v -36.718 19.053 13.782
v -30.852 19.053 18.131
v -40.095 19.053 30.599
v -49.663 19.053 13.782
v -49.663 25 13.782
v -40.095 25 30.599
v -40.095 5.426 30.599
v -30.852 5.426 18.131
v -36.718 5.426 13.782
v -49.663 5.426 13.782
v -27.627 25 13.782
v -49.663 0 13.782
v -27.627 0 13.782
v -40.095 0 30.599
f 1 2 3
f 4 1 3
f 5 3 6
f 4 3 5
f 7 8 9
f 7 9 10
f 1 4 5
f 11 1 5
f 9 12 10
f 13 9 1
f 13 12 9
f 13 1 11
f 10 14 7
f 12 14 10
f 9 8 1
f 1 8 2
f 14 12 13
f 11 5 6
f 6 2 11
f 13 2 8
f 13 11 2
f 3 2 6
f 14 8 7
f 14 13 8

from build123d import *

# Parameters (mm, degrees)
F1_DEPTH = 25
F2_W     = 13.627150096
F2_H     = 15.5199997797
F3_DEPTH = 25
F4_R     = 3.852849114
F5_DEPTH = 25


with BuildPart() as f1:
    # F0 (on Front) → F1 (new body)
    with BuildSketch(Plane.XZ):
        Polygon((-27.6273339987, 13.7823959813), (-40.0947295129, 30.5988863111), (-49.6627315879, 13.7823959813), align=None)
    extrude(amount=-F1_DEPTH)

    # F2 (on face) → F3 (cut)
    with BuildSketch(Plane(origin=(-11.2344276136, 0, -8.3289705336), x_dir=(0, 1, 0), z_dir=(0.8033118285, 0, 0.5955586505))):
        with Locations((12.2393383645, 40.6992104239)):
            Rectangle(F2_W, F2_H)
    extrude(amount=-F3_DEPTH, mode=Mode.SUBTRACT)


with BuildPart() as f5:
    # F4 (on Right) → F5 (new body)
    with BuildSketch(Plane.YZ):
        with Locations((-33.5409045219, 28.1745772809)):
            Circle(F4_R)
    extrude(amount=-F5_DEPTH)


solid = f1.part
